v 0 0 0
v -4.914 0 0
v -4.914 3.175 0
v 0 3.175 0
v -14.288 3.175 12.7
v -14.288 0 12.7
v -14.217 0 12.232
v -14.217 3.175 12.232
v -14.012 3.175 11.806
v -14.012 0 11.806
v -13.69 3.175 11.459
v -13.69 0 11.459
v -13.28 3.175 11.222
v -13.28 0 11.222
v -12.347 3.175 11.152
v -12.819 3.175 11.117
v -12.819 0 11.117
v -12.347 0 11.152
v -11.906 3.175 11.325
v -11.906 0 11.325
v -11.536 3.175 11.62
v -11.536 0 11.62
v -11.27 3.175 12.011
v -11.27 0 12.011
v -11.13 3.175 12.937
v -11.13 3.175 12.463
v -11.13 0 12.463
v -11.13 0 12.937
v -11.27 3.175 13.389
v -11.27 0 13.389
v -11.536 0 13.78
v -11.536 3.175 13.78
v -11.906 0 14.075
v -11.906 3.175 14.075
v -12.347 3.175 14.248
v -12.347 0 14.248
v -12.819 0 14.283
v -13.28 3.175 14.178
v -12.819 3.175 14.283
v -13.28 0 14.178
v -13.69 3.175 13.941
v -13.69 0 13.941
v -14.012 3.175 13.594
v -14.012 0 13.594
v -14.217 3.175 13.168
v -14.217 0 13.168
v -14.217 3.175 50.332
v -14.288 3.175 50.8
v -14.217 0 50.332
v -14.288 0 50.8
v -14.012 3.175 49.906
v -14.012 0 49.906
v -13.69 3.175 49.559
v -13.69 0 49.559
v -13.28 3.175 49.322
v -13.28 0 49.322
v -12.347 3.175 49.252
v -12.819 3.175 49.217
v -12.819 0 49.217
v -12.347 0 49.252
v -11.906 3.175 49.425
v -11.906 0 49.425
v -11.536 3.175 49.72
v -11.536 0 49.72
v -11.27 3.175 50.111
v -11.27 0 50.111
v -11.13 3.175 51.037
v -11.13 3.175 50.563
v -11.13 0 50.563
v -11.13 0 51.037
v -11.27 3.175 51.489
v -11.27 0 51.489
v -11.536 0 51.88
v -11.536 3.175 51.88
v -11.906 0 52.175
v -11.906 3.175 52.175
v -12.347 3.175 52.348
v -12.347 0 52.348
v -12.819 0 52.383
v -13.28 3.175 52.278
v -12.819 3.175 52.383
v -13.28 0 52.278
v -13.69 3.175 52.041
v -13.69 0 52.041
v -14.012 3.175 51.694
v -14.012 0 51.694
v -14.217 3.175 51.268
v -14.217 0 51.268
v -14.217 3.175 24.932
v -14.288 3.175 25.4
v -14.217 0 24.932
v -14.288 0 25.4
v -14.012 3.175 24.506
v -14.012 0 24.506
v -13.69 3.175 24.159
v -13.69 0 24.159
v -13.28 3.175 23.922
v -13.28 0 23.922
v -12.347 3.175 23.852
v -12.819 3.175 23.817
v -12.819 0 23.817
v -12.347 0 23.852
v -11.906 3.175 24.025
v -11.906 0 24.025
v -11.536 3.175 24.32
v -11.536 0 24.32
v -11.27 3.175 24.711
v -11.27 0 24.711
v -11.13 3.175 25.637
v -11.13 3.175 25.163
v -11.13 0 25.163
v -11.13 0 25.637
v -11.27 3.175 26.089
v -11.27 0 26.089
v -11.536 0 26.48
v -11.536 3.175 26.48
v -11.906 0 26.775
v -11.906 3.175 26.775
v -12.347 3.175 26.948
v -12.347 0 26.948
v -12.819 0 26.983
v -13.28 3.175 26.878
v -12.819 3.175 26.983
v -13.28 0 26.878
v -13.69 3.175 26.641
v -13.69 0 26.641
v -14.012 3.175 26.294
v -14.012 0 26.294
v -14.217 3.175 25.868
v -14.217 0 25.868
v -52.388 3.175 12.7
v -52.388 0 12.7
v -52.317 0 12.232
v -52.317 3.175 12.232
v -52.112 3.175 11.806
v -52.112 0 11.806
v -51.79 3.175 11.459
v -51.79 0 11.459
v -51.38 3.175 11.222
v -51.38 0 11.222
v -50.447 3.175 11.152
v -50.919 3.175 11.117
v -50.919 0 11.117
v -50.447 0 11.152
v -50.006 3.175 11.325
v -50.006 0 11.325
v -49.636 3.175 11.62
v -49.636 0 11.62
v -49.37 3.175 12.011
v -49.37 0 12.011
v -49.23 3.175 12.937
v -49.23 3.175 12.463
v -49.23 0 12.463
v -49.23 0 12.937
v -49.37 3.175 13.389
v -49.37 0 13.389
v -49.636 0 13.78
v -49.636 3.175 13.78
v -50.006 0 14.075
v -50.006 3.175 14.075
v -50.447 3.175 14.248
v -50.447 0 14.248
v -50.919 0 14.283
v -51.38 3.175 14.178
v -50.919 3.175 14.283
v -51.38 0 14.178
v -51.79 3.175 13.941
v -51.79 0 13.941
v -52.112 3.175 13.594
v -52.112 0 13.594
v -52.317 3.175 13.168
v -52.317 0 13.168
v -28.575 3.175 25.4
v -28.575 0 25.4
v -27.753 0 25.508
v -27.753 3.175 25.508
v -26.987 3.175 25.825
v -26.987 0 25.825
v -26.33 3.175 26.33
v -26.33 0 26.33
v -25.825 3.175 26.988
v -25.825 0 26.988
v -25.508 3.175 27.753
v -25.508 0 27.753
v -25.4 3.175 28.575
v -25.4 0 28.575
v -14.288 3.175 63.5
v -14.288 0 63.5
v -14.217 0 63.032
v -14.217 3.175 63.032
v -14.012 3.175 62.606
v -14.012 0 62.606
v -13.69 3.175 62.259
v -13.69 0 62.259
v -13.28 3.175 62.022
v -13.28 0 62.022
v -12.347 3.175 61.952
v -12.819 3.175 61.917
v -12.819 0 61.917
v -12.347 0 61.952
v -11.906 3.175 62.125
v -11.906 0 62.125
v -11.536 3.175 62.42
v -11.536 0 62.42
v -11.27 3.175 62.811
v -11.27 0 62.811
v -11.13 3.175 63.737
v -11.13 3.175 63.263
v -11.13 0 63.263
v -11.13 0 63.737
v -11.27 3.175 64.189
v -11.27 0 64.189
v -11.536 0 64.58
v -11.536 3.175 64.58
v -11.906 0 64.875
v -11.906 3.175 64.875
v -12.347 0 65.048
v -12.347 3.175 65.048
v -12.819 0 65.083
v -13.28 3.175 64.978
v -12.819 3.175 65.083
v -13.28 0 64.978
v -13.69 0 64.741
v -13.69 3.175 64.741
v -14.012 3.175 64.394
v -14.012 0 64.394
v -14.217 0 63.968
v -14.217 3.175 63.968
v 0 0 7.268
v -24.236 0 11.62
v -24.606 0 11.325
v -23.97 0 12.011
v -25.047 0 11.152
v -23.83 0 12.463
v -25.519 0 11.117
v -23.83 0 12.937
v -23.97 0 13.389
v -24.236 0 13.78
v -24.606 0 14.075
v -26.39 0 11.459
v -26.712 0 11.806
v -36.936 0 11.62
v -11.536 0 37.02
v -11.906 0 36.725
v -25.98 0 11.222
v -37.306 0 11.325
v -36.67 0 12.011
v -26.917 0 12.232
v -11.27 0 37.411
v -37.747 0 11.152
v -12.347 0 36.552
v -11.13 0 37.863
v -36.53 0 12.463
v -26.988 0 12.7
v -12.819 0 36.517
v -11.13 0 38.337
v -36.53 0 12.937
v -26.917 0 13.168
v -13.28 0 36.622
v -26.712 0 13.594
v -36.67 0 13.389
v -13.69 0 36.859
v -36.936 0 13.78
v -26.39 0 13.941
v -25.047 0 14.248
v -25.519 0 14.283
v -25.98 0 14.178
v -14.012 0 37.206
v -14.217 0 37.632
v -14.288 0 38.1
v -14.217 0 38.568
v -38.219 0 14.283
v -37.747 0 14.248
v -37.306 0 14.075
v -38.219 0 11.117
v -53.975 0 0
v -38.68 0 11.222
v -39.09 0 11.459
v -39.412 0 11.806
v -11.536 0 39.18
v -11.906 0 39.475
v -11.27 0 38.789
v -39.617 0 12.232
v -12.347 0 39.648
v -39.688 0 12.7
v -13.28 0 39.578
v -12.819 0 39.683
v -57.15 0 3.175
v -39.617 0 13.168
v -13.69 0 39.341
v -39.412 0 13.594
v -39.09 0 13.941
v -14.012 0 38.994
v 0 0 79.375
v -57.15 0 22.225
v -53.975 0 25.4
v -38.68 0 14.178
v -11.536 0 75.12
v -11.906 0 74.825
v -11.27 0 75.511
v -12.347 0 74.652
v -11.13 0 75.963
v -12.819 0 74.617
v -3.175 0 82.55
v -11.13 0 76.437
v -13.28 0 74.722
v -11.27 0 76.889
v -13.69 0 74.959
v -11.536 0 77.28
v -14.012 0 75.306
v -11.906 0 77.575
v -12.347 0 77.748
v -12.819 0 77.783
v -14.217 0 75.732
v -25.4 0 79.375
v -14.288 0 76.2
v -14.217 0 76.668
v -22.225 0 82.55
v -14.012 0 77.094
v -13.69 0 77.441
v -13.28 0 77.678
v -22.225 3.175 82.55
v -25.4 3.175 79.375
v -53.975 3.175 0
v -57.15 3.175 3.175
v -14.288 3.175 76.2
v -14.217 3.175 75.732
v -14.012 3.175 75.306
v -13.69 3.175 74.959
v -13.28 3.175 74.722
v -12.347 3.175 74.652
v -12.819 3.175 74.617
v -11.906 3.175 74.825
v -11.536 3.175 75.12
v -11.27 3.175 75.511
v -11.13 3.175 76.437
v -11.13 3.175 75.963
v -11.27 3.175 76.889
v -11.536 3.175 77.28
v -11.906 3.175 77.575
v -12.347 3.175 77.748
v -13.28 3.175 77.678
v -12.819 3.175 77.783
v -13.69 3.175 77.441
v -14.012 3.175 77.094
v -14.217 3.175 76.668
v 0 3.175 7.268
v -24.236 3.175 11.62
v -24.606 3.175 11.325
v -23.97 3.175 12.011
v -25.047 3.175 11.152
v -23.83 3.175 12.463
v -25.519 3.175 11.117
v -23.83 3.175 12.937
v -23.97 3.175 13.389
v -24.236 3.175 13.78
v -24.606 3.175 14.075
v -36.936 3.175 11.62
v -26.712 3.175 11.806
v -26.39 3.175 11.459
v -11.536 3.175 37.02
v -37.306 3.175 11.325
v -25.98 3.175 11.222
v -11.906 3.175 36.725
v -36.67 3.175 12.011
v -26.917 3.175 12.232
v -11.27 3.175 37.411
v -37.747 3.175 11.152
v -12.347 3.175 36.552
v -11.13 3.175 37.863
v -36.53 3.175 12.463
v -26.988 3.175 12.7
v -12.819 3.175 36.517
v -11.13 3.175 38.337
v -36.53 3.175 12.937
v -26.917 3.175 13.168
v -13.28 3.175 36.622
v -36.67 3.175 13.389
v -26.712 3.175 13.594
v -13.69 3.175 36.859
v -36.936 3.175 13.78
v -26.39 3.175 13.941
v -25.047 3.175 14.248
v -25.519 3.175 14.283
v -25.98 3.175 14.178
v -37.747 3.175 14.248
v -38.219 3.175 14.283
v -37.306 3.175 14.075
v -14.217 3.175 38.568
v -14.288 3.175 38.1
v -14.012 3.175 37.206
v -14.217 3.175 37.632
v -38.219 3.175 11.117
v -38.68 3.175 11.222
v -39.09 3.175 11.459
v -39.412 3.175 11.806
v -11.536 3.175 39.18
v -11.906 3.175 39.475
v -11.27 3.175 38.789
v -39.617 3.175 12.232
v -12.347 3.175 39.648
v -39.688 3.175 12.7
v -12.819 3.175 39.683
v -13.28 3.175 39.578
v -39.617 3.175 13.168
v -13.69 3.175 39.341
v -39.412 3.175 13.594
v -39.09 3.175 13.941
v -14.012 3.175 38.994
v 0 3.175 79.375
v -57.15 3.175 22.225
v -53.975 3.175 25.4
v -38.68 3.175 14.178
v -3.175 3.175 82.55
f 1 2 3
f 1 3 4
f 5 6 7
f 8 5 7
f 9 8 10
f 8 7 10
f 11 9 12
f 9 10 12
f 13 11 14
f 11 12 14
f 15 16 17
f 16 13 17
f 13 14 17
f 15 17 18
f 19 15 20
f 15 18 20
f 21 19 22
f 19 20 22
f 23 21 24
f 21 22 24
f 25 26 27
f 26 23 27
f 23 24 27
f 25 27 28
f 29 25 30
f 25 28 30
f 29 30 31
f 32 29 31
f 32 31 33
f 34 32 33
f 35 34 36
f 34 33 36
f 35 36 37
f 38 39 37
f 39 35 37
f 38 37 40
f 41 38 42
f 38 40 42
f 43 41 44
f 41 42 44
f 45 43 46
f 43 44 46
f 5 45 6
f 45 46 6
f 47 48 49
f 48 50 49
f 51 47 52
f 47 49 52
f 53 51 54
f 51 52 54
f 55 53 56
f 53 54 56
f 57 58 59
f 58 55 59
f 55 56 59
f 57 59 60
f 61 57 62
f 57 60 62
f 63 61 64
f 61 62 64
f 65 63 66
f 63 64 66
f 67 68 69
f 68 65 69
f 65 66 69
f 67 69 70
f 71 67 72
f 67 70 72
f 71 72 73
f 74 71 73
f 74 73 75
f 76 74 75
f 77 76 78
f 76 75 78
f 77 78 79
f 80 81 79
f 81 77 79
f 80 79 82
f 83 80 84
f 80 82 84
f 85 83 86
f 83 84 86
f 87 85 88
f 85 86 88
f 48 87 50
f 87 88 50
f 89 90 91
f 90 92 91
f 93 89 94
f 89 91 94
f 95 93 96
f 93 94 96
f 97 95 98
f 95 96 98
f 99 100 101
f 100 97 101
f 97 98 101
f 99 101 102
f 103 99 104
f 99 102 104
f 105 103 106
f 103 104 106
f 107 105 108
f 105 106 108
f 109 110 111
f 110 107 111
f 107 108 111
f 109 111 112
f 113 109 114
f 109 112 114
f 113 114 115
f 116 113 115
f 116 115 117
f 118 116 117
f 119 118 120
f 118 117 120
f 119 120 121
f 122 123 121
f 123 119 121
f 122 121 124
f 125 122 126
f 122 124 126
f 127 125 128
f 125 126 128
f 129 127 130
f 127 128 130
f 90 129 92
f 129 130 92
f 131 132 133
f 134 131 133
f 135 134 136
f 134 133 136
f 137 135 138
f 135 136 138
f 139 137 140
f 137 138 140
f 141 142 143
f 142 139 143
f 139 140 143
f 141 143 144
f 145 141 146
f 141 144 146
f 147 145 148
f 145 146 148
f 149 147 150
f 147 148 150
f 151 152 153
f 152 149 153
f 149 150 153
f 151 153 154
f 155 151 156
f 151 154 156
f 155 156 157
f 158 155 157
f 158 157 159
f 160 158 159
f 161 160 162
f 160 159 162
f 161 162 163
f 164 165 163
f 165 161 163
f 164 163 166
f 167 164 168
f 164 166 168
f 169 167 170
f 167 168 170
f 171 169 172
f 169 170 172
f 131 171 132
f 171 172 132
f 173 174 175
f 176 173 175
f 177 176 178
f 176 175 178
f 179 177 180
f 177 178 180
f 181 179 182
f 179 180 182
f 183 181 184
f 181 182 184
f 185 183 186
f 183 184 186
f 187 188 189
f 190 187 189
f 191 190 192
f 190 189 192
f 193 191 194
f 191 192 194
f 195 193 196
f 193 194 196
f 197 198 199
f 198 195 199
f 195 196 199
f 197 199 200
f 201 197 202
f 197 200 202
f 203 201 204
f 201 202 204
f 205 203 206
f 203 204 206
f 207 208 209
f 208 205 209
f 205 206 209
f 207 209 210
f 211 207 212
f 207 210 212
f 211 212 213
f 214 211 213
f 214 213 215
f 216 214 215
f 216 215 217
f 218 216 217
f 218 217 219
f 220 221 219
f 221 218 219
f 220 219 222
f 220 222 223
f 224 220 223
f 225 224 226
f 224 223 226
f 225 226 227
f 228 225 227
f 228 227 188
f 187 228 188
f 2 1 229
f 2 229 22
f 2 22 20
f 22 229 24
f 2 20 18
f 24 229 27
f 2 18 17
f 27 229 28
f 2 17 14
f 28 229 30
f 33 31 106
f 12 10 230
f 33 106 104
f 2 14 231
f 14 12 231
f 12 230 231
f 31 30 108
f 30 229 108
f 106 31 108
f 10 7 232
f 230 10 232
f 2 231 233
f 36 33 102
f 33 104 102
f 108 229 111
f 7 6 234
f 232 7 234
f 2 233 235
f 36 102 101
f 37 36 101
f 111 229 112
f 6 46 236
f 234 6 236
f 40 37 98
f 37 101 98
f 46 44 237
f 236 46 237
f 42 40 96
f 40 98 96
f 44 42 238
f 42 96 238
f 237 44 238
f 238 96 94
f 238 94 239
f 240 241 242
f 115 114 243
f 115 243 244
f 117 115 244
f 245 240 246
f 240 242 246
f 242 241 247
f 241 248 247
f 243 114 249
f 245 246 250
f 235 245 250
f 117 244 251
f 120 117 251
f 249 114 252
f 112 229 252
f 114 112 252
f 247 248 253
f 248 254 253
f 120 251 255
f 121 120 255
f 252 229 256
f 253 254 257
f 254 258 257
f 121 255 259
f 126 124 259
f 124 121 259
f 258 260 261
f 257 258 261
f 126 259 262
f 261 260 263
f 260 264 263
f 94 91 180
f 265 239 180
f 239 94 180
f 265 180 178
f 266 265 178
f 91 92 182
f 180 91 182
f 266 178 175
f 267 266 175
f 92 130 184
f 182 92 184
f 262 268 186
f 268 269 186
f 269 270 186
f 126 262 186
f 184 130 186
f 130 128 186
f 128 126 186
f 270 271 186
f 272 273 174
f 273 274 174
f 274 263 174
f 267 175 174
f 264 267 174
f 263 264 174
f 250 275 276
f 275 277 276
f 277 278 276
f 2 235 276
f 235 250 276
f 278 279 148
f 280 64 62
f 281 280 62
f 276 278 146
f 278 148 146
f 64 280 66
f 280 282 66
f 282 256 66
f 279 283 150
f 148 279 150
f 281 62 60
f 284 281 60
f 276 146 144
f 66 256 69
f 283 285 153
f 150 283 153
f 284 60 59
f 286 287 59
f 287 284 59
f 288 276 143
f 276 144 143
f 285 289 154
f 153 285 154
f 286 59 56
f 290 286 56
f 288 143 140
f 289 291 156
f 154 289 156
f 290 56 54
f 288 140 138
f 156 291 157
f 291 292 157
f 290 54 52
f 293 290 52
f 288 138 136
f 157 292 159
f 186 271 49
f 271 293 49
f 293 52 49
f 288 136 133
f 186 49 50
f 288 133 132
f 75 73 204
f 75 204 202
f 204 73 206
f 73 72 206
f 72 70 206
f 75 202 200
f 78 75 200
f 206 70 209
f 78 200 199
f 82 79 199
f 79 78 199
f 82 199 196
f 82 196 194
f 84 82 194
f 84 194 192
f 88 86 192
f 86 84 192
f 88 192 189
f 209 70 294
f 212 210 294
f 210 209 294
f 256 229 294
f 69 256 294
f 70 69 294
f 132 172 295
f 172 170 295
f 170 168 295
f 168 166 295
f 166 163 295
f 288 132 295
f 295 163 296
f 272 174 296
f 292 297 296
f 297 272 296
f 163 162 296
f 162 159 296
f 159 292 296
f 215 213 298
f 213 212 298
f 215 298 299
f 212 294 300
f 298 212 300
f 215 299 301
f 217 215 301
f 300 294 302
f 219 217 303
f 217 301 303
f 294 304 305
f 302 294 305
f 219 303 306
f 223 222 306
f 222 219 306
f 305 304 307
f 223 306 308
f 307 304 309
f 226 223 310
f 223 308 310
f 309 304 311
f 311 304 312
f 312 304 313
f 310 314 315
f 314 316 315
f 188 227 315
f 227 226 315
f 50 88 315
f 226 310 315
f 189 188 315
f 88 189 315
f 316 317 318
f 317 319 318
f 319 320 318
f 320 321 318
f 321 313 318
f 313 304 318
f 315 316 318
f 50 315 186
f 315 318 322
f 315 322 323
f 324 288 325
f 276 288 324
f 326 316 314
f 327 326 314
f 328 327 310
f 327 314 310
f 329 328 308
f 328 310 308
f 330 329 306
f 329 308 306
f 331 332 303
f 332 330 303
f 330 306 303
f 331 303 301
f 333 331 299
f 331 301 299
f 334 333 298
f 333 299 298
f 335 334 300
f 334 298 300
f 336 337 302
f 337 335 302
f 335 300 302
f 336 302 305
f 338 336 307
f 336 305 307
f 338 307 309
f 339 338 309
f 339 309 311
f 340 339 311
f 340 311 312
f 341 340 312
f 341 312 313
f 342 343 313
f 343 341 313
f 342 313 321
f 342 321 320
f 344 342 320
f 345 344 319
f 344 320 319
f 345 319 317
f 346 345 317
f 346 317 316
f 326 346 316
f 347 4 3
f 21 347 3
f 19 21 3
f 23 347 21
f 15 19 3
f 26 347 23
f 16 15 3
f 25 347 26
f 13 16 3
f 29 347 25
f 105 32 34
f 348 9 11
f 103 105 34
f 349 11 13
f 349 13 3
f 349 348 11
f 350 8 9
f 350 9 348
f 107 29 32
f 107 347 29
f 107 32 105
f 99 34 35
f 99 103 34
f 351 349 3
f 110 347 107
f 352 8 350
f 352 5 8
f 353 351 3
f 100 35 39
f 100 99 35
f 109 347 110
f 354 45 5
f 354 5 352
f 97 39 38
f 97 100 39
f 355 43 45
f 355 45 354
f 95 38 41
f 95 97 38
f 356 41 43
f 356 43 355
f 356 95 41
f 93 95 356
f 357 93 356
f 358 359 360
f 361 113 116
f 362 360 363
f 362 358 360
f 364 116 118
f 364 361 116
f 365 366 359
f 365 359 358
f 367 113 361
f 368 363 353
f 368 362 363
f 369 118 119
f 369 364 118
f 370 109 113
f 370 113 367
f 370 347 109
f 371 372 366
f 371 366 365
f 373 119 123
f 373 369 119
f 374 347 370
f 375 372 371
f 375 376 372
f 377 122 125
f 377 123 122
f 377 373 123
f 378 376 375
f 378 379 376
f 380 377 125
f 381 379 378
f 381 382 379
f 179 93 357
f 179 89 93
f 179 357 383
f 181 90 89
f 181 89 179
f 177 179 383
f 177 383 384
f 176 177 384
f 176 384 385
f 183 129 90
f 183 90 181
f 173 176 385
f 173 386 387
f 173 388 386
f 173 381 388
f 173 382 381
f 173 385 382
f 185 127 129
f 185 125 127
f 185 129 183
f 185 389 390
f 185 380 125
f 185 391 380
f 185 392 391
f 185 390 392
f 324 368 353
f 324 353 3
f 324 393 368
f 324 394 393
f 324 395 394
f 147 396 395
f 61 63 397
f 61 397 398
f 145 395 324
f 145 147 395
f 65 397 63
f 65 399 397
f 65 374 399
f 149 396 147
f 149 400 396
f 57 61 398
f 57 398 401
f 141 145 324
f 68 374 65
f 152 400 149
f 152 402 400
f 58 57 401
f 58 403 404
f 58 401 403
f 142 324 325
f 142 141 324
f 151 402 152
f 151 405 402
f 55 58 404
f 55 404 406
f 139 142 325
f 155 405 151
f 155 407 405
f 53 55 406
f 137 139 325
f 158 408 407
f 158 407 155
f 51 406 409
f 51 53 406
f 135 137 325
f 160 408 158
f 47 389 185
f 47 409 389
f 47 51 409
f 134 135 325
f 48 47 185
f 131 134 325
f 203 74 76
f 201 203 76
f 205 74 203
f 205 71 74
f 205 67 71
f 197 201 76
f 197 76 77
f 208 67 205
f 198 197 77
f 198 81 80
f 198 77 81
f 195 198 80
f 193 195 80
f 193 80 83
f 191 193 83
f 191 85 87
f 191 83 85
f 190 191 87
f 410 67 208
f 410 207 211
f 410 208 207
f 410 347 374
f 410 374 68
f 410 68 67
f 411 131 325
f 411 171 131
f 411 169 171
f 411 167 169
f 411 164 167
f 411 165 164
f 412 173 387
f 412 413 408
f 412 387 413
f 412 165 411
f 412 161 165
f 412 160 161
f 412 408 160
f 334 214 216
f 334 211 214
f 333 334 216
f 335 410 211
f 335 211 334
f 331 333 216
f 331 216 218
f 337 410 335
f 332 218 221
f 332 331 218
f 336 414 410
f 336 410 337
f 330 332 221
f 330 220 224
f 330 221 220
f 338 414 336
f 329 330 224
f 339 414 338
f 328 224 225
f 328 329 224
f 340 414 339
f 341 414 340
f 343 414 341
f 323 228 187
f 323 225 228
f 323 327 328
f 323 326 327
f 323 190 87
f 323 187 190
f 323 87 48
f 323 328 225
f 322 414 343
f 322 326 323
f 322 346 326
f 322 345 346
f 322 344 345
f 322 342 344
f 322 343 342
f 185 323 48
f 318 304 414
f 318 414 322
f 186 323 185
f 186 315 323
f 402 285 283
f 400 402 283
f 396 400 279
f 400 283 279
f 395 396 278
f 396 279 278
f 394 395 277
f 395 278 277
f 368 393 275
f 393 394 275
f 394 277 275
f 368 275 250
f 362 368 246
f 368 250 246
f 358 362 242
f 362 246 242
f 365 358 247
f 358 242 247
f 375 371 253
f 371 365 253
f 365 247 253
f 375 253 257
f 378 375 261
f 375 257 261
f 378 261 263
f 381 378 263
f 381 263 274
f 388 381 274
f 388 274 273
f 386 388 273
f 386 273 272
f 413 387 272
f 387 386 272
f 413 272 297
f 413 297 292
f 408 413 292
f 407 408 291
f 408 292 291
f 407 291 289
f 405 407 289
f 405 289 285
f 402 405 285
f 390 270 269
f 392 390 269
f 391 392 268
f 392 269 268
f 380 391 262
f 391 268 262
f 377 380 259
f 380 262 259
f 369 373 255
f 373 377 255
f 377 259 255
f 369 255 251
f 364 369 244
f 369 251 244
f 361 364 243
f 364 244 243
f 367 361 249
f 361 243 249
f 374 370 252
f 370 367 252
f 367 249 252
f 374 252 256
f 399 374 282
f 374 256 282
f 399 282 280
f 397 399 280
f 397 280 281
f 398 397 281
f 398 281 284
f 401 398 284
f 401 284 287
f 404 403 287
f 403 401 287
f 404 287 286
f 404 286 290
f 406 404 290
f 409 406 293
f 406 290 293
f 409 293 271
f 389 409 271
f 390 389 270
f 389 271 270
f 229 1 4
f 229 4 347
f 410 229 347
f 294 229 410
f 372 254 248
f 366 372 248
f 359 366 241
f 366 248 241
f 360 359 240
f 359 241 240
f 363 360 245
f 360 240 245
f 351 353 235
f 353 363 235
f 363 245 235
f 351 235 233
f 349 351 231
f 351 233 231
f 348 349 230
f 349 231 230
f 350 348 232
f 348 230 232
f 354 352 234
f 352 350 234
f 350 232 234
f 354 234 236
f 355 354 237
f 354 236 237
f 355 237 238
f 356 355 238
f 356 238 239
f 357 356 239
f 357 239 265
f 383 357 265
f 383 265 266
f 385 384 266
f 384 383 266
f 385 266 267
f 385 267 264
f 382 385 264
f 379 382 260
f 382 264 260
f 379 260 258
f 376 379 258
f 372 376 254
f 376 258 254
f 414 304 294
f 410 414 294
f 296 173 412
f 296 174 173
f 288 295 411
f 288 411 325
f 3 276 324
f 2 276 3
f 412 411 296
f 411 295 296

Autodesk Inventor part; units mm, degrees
ref_plane "YZ Plane" through (0, 0, 0) normal (1, 0, 0) x (0, 1, 0)
ref_plane "XZ Plane" through (0, 0, 0) normal (0, 1, 0) x (-1, 0, 0)
ref_plane "XY Plane" through (0, 0, 0) normal (0, 0, 1) x (1, 0, 0)
sketch "Sketch1" plane through (0, 0, 0) normal (0, 1, 0) x (-1, 0, 0)
  line L0 (4.9142, 0) -> (0, 0)
  line L1 (0, 0) -> (0, 7.2679)
  circle A0 centre (12.7, 12.7) radius 1.5875
  circle A1 centre (25.4, 12.7) radius 1.5875
  circle A2 centre (38.1, 12.7) radius 1.5875
  circle A3 centre (50.8, 12.7) radius 1.5875
  circle A4 centre (12.7, 25.4) radius 1.5875
  circle A5 centre (12.7, 38.1) radius 1.5875
  circle A6 centre (12.7, 50.8) radius 1.5875
  circle A7 centre (12.7, 63.5) radius 1.5875
  circle A8 centre (12.7, 76.2) radius 1.5875
  line L2 (0, 7.2679) -> (0, 79.375)
  line L3 (3.175, 82.55) -> (22.225, 82.55)
  line L4 (25.4, 79.375) -> (25.4, 28.575)
  line L5 (28.575, 25.4) -> (53.975, 25.4)
  line L6 (57.15, 22.225) -> (57.15, 3.175)
  line L7 (53.975, 0) -> (4.9142, 0)
  line L8 (57.15, 22.225) -> (53.975, 25.4)
  line L9 (57.15, 3.175) -> (53.975, 0)
  line L10 (3.175, 82.55) -> (0, 79.375)
  line L11 (22.225, 82.55) -> (25.4, 79.375)
  arc A9 (25.4, 28.575) -> (28.575, 25.4) centre (28.575, 28.575) ccw
  point P0 (2.4571, 0)
  point P1 (0, 82.55)
  point P2 (25.4, 82.55)
  point P3 (25.4, 25.4)
  point P4 (57.15, 25.4)
  point P5 (57.15, 0)
  point P6 (57.15, 12.7)
  dimension "d0" = 3.175
  dimension "d1" = 12.7
  dimension "d2" = 12.7
  dimension "d5" = 12.7
  dimension "d12" = 12.7
  dimension "d17" = 25.4
  dimension "d18" = 6.35
  dimension "d19" = 12.7
  dimension "d20" = 6.35
  dimension "d21" = 3.175
  dimension "d22" = 3.175
  dimension "d23" = 3.175
  dimension "d24" = 3.175
  dimension "d25" = 3.175
  dimension "d26" = 3.175
  dimension "d27" = 3.175
  dimension "d28" = 3.175
  dimension "d29" = 3.175
extrude "Extrusion1" add sketch "Sketch1" along normal blind 3.175
equation "\"d22\" = d21"
equation "\"d23\" = d21"
equation "\"d24\" = d23"
equation "\"d26\" = d25"
equation "\"d27\" = d25"
equation "\"d28\" = d27"
properties part number "L-Bracket (4x6)"
